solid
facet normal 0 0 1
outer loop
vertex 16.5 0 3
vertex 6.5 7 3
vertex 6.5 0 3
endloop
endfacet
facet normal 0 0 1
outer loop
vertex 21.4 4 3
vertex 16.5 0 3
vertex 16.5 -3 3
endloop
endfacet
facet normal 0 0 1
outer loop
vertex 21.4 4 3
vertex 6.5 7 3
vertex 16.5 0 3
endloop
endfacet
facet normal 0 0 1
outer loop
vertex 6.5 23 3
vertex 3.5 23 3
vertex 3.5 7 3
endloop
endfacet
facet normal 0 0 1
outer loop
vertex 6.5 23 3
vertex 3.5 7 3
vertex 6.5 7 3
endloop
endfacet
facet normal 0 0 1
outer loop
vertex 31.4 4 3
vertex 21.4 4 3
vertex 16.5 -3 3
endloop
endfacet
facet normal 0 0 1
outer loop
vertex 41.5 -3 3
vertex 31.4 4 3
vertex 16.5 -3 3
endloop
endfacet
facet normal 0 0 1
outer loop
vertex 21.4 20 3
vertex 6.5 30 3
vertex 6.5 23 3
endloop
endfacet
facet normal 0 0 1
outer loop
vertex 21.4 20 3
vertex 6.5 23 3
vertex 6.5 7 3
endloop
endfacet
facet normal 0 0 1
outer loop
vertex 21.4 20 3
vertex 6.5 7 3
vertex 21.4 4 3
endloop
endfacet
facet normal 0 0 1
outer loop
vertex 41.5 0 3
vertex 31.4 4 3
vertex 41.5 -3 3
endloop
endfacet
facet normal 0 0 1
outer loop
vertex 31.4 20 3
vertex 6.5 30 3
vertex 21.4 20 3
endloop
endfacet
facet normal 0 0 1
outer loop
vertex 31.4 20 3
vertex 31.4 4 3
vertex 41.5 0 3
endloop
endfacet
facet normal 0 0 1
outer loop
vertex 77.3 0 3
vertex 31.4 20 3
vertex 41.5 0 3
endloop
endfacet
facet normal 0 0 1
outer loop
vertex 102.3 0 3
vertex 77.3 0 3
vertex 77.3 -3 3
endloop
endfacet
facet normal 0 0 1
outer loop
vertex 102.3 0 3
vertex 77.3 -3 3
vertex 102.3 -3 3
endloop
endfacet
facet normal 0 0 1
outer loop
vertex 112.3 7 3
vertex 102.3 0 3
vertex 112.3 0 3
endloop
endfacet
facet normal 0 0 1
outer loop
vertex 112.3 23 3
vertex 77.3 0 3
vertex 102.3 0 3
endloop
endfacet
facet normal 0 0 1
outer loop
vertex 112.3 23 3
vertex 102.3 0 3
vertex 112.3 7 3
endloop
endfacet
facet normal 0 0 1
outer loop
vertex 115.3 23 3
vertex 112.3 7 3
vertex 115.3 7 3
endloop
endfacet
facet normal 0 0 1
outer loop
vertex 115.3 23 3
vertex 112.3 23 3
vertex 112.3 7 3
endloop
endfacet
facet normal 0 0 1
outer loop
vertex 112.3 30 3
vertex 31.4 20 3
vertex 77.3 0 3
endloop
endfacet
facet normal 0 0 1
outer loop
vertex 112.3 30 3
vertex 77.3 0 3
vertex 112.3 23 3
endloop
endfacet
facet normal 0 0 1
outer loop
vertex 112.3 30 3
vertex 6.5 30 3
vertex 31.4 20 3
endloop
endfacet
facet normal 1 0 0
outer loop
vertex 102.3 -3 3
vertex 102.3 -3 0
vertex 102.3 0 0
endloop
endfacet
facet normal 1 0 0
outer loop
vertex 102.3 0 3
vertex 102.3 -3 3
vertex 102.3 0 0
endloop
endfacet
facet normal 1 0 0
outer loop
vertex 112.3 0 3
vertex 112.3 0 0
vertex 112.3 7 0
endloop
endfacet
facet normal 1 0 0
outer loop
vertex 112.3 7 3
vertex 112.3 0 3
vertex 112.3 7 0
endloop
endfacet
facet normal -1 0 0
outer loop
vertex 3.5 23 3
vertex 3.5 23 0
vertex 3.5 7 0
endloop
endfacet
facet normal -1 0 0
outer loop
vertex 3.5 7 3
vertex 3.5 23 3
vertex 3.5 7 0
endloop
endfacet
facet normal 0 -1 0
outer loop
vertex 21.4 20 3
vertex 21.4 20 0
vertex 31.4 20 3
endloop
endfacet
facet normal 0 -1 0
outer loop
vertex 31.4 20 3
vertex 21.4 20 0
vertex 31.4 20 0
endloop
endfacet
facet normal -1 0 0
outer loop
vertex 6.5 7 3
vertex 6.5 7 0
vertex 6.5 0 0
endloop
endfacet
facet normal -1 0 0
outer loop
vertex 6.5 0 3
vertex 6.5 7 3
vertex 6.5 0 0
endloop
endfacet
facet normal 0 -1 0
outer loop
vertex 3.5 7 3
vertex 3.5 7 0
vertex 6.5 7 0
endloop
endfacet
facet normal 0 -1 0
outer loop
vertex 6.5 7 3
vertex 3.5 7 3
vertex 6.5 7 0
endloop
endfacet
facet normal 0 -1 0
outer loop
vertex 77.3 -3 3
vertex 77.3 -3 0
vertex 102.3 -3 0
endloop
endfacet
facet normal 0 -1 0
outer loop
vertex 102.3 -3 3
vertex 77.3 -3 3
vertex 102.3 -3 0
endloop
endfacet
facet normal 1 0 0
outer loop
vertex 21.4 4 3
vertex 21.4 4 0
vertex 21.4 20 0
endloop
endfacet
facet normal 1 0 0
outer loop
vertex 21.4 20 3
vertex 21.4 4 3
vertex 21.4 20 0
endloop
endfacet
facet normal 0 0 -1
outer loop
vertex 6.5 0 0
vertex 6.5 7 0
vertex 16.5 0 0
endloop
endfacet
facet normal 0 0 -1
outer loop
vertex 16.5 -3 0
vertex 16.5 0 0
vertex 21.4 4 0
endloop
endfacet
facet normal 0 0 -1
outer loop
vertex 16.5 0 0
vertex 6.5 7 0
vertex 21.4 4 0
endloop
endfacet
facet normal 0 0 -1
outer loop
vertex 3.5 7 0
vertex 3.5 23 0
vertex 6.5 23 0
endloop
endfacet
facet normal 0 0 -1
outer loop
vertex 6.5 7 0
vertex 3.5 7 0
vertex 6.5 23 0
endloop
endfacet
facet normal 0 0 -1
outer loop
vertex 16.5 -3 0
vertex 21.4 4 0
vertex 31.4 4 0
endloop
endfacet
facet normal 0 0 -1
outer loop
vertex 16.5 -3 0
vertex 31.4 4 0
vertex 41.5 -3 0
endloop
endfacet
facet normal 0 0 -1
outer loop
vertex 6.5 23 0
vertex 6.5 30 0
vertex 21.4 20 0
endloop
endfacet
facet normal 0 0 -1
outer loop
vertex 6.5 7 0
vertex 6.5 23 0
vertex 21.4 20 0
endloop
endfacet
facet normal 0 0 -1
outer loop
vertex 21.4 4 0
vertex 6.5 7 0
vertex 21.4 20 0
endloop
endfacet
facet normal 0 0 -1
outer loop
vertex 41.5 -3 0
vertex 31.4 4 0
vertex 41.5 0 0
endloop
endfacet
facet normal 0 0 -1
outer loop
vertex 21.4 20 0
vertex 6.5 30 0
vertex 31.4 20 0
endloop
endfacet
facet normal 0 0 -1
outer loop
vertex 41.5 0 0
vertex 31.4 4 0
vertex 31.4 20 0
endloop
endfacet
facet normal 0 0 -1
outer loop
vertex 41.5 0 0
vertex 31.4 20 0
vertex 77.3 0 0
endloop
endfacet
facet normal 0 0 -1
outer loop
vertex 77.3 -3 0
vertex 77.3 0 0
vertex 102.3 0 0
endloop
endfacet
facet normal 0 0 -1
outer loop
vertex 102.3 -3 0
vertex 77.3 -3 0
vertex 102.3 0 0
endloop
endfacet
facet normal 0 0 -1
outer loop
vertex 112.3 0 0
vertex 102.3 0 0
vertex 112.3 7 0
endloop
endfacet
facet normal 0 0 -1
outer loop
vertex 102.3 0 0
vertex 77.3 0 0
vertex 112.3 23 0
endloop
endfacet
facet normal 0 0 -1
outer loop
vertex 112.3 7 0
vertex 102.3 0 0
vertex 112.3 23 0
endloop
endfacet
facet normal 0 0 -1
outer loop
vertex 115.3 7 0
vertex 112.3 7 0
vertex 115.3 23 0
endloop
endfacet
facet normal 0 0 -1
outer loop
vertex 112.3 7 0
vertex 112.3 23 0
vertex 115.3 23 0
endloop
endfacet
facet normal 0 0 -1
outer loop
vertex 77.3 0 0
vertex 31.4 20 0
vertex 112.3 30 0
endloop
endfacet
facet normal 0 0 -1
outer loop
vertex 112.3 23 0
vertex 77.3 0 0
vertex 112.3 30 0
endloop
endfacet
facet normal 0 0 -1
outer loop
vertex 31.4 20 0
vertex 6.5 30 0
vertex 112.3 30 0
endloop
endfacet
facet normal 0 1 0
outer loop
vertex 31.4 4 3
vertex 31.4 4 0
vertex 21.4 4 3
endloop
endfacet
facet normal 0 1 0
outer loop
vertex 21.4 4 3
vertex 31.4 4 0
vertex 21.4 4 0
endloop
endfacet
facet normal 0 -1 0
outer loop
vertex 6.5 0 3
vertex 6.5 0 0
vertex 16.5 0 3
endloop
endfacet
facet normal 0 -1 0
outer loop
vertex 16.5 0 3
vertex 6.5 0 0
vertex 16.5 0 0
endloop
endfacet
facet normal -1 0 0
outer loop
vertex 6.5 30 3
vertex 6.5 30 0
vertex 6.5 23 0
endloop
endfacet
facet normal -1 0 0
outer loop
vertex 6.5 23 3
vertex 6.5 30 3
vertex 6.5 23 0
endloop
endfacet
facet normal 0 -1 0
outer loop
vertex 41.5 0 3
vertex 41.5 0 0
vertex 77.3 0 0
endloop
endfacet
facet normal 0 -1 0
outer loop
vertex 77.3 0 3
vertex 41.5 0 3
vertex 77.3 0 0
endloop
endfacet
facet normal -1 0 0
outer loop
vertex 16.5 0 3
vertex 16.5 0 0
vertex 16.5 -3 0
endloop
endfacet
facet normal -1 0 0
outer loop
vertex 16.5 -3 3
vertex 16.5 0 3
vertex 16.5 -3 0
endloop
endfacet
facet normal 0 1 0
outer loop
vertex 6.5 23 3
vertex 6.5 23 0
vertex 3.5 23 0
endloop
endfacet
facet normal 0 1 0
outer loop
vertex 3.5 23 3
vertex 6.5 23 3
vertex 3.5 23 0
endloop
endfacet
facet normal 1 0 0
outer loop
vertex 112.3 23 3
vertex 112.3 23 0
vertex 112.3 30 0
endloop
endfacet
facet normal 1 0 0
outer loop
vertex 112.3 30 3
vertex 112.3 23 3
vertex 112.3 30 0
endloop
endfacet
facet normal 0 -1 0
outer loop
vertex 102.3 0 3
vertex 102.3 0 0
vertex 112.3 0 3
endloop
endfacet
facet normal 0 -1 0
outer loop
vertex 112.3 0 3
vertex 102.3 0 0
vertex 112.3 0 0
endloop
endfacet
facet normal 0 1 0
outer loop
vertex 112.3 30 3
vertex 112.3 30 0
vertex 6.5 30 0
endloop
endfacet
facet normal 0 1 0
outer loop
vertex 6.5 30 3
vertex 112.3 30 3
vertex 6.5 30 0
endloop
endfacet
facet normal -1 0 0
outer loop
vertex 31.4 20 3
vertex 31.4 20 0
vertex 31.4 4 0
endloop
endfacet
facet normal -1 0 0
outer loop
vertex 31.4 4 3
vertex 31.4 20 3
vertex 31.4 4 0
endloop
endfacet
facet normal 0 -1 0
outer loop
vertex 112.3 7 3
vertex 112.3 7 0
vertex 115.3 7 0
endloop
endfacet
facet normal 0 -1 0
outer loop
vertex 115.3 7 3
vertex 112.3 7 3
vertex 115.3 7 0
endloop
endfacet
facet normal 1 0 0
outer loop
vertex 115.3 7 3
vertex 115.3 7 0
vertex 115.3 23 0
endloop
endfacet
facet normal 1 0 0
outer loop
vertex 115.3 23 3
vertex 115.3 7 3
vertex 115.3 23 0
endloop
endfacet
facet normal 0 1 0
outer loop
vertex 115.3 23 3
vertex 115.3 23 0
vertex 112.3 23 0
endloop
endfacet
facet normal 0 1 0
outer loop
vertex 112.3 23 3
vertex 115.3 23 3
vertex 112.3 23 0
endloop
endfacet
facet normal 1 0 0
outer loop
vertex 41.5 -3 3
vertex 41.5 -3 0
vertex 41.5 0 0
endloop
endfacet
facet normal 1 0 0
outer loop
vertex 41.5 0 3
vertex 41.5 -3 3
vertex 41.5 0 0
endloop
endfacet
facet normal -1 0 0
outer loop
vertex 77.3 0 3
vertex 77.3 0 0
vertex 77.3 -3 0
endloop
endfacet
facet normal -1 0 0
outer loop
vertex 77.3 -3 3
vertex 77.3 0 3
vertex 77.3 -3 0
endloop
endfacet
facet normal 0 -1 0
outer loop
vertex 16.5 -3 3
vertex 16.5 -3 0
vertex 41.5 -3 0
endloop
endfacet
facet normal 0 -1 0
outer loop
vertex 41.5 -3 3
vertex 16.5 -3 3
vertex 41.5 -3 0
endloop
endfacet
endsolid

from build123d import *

# Parameters (mm, degrees)
EXTRUDE_1_DEPTH = 3


with BuildPart() as part:
    # 草图2 → 凸台-拉伸1 (new body)
    with BuildSketch(Plane.XY):
        Polygon((41.5, 0), (59.4, 0), (77.3, 0), (77.3, -3), (102.3, -3), (102.3, 0), (112.3, 0), (112.3, 7), (115.3, 7), (115.3, 23), (112.3, 23), (112.3, 30), (6.5, 30), (6.5, 23), (3.5, 23), (3.5, 7), (6.5, 7), (6.5, 0), (16.5, 0), (16.5, -3), (41.5, -3), align=None)
        Polygon((26.4, 4), (21.4, 4), (21.4, 20), (26.4, 20), (31.4, 20), (31.4, 4), align=None, mode=Mode.SUBTRACT)
    extrude(amount=EXTRUDE_1_DEPTH)


solid = part.part
